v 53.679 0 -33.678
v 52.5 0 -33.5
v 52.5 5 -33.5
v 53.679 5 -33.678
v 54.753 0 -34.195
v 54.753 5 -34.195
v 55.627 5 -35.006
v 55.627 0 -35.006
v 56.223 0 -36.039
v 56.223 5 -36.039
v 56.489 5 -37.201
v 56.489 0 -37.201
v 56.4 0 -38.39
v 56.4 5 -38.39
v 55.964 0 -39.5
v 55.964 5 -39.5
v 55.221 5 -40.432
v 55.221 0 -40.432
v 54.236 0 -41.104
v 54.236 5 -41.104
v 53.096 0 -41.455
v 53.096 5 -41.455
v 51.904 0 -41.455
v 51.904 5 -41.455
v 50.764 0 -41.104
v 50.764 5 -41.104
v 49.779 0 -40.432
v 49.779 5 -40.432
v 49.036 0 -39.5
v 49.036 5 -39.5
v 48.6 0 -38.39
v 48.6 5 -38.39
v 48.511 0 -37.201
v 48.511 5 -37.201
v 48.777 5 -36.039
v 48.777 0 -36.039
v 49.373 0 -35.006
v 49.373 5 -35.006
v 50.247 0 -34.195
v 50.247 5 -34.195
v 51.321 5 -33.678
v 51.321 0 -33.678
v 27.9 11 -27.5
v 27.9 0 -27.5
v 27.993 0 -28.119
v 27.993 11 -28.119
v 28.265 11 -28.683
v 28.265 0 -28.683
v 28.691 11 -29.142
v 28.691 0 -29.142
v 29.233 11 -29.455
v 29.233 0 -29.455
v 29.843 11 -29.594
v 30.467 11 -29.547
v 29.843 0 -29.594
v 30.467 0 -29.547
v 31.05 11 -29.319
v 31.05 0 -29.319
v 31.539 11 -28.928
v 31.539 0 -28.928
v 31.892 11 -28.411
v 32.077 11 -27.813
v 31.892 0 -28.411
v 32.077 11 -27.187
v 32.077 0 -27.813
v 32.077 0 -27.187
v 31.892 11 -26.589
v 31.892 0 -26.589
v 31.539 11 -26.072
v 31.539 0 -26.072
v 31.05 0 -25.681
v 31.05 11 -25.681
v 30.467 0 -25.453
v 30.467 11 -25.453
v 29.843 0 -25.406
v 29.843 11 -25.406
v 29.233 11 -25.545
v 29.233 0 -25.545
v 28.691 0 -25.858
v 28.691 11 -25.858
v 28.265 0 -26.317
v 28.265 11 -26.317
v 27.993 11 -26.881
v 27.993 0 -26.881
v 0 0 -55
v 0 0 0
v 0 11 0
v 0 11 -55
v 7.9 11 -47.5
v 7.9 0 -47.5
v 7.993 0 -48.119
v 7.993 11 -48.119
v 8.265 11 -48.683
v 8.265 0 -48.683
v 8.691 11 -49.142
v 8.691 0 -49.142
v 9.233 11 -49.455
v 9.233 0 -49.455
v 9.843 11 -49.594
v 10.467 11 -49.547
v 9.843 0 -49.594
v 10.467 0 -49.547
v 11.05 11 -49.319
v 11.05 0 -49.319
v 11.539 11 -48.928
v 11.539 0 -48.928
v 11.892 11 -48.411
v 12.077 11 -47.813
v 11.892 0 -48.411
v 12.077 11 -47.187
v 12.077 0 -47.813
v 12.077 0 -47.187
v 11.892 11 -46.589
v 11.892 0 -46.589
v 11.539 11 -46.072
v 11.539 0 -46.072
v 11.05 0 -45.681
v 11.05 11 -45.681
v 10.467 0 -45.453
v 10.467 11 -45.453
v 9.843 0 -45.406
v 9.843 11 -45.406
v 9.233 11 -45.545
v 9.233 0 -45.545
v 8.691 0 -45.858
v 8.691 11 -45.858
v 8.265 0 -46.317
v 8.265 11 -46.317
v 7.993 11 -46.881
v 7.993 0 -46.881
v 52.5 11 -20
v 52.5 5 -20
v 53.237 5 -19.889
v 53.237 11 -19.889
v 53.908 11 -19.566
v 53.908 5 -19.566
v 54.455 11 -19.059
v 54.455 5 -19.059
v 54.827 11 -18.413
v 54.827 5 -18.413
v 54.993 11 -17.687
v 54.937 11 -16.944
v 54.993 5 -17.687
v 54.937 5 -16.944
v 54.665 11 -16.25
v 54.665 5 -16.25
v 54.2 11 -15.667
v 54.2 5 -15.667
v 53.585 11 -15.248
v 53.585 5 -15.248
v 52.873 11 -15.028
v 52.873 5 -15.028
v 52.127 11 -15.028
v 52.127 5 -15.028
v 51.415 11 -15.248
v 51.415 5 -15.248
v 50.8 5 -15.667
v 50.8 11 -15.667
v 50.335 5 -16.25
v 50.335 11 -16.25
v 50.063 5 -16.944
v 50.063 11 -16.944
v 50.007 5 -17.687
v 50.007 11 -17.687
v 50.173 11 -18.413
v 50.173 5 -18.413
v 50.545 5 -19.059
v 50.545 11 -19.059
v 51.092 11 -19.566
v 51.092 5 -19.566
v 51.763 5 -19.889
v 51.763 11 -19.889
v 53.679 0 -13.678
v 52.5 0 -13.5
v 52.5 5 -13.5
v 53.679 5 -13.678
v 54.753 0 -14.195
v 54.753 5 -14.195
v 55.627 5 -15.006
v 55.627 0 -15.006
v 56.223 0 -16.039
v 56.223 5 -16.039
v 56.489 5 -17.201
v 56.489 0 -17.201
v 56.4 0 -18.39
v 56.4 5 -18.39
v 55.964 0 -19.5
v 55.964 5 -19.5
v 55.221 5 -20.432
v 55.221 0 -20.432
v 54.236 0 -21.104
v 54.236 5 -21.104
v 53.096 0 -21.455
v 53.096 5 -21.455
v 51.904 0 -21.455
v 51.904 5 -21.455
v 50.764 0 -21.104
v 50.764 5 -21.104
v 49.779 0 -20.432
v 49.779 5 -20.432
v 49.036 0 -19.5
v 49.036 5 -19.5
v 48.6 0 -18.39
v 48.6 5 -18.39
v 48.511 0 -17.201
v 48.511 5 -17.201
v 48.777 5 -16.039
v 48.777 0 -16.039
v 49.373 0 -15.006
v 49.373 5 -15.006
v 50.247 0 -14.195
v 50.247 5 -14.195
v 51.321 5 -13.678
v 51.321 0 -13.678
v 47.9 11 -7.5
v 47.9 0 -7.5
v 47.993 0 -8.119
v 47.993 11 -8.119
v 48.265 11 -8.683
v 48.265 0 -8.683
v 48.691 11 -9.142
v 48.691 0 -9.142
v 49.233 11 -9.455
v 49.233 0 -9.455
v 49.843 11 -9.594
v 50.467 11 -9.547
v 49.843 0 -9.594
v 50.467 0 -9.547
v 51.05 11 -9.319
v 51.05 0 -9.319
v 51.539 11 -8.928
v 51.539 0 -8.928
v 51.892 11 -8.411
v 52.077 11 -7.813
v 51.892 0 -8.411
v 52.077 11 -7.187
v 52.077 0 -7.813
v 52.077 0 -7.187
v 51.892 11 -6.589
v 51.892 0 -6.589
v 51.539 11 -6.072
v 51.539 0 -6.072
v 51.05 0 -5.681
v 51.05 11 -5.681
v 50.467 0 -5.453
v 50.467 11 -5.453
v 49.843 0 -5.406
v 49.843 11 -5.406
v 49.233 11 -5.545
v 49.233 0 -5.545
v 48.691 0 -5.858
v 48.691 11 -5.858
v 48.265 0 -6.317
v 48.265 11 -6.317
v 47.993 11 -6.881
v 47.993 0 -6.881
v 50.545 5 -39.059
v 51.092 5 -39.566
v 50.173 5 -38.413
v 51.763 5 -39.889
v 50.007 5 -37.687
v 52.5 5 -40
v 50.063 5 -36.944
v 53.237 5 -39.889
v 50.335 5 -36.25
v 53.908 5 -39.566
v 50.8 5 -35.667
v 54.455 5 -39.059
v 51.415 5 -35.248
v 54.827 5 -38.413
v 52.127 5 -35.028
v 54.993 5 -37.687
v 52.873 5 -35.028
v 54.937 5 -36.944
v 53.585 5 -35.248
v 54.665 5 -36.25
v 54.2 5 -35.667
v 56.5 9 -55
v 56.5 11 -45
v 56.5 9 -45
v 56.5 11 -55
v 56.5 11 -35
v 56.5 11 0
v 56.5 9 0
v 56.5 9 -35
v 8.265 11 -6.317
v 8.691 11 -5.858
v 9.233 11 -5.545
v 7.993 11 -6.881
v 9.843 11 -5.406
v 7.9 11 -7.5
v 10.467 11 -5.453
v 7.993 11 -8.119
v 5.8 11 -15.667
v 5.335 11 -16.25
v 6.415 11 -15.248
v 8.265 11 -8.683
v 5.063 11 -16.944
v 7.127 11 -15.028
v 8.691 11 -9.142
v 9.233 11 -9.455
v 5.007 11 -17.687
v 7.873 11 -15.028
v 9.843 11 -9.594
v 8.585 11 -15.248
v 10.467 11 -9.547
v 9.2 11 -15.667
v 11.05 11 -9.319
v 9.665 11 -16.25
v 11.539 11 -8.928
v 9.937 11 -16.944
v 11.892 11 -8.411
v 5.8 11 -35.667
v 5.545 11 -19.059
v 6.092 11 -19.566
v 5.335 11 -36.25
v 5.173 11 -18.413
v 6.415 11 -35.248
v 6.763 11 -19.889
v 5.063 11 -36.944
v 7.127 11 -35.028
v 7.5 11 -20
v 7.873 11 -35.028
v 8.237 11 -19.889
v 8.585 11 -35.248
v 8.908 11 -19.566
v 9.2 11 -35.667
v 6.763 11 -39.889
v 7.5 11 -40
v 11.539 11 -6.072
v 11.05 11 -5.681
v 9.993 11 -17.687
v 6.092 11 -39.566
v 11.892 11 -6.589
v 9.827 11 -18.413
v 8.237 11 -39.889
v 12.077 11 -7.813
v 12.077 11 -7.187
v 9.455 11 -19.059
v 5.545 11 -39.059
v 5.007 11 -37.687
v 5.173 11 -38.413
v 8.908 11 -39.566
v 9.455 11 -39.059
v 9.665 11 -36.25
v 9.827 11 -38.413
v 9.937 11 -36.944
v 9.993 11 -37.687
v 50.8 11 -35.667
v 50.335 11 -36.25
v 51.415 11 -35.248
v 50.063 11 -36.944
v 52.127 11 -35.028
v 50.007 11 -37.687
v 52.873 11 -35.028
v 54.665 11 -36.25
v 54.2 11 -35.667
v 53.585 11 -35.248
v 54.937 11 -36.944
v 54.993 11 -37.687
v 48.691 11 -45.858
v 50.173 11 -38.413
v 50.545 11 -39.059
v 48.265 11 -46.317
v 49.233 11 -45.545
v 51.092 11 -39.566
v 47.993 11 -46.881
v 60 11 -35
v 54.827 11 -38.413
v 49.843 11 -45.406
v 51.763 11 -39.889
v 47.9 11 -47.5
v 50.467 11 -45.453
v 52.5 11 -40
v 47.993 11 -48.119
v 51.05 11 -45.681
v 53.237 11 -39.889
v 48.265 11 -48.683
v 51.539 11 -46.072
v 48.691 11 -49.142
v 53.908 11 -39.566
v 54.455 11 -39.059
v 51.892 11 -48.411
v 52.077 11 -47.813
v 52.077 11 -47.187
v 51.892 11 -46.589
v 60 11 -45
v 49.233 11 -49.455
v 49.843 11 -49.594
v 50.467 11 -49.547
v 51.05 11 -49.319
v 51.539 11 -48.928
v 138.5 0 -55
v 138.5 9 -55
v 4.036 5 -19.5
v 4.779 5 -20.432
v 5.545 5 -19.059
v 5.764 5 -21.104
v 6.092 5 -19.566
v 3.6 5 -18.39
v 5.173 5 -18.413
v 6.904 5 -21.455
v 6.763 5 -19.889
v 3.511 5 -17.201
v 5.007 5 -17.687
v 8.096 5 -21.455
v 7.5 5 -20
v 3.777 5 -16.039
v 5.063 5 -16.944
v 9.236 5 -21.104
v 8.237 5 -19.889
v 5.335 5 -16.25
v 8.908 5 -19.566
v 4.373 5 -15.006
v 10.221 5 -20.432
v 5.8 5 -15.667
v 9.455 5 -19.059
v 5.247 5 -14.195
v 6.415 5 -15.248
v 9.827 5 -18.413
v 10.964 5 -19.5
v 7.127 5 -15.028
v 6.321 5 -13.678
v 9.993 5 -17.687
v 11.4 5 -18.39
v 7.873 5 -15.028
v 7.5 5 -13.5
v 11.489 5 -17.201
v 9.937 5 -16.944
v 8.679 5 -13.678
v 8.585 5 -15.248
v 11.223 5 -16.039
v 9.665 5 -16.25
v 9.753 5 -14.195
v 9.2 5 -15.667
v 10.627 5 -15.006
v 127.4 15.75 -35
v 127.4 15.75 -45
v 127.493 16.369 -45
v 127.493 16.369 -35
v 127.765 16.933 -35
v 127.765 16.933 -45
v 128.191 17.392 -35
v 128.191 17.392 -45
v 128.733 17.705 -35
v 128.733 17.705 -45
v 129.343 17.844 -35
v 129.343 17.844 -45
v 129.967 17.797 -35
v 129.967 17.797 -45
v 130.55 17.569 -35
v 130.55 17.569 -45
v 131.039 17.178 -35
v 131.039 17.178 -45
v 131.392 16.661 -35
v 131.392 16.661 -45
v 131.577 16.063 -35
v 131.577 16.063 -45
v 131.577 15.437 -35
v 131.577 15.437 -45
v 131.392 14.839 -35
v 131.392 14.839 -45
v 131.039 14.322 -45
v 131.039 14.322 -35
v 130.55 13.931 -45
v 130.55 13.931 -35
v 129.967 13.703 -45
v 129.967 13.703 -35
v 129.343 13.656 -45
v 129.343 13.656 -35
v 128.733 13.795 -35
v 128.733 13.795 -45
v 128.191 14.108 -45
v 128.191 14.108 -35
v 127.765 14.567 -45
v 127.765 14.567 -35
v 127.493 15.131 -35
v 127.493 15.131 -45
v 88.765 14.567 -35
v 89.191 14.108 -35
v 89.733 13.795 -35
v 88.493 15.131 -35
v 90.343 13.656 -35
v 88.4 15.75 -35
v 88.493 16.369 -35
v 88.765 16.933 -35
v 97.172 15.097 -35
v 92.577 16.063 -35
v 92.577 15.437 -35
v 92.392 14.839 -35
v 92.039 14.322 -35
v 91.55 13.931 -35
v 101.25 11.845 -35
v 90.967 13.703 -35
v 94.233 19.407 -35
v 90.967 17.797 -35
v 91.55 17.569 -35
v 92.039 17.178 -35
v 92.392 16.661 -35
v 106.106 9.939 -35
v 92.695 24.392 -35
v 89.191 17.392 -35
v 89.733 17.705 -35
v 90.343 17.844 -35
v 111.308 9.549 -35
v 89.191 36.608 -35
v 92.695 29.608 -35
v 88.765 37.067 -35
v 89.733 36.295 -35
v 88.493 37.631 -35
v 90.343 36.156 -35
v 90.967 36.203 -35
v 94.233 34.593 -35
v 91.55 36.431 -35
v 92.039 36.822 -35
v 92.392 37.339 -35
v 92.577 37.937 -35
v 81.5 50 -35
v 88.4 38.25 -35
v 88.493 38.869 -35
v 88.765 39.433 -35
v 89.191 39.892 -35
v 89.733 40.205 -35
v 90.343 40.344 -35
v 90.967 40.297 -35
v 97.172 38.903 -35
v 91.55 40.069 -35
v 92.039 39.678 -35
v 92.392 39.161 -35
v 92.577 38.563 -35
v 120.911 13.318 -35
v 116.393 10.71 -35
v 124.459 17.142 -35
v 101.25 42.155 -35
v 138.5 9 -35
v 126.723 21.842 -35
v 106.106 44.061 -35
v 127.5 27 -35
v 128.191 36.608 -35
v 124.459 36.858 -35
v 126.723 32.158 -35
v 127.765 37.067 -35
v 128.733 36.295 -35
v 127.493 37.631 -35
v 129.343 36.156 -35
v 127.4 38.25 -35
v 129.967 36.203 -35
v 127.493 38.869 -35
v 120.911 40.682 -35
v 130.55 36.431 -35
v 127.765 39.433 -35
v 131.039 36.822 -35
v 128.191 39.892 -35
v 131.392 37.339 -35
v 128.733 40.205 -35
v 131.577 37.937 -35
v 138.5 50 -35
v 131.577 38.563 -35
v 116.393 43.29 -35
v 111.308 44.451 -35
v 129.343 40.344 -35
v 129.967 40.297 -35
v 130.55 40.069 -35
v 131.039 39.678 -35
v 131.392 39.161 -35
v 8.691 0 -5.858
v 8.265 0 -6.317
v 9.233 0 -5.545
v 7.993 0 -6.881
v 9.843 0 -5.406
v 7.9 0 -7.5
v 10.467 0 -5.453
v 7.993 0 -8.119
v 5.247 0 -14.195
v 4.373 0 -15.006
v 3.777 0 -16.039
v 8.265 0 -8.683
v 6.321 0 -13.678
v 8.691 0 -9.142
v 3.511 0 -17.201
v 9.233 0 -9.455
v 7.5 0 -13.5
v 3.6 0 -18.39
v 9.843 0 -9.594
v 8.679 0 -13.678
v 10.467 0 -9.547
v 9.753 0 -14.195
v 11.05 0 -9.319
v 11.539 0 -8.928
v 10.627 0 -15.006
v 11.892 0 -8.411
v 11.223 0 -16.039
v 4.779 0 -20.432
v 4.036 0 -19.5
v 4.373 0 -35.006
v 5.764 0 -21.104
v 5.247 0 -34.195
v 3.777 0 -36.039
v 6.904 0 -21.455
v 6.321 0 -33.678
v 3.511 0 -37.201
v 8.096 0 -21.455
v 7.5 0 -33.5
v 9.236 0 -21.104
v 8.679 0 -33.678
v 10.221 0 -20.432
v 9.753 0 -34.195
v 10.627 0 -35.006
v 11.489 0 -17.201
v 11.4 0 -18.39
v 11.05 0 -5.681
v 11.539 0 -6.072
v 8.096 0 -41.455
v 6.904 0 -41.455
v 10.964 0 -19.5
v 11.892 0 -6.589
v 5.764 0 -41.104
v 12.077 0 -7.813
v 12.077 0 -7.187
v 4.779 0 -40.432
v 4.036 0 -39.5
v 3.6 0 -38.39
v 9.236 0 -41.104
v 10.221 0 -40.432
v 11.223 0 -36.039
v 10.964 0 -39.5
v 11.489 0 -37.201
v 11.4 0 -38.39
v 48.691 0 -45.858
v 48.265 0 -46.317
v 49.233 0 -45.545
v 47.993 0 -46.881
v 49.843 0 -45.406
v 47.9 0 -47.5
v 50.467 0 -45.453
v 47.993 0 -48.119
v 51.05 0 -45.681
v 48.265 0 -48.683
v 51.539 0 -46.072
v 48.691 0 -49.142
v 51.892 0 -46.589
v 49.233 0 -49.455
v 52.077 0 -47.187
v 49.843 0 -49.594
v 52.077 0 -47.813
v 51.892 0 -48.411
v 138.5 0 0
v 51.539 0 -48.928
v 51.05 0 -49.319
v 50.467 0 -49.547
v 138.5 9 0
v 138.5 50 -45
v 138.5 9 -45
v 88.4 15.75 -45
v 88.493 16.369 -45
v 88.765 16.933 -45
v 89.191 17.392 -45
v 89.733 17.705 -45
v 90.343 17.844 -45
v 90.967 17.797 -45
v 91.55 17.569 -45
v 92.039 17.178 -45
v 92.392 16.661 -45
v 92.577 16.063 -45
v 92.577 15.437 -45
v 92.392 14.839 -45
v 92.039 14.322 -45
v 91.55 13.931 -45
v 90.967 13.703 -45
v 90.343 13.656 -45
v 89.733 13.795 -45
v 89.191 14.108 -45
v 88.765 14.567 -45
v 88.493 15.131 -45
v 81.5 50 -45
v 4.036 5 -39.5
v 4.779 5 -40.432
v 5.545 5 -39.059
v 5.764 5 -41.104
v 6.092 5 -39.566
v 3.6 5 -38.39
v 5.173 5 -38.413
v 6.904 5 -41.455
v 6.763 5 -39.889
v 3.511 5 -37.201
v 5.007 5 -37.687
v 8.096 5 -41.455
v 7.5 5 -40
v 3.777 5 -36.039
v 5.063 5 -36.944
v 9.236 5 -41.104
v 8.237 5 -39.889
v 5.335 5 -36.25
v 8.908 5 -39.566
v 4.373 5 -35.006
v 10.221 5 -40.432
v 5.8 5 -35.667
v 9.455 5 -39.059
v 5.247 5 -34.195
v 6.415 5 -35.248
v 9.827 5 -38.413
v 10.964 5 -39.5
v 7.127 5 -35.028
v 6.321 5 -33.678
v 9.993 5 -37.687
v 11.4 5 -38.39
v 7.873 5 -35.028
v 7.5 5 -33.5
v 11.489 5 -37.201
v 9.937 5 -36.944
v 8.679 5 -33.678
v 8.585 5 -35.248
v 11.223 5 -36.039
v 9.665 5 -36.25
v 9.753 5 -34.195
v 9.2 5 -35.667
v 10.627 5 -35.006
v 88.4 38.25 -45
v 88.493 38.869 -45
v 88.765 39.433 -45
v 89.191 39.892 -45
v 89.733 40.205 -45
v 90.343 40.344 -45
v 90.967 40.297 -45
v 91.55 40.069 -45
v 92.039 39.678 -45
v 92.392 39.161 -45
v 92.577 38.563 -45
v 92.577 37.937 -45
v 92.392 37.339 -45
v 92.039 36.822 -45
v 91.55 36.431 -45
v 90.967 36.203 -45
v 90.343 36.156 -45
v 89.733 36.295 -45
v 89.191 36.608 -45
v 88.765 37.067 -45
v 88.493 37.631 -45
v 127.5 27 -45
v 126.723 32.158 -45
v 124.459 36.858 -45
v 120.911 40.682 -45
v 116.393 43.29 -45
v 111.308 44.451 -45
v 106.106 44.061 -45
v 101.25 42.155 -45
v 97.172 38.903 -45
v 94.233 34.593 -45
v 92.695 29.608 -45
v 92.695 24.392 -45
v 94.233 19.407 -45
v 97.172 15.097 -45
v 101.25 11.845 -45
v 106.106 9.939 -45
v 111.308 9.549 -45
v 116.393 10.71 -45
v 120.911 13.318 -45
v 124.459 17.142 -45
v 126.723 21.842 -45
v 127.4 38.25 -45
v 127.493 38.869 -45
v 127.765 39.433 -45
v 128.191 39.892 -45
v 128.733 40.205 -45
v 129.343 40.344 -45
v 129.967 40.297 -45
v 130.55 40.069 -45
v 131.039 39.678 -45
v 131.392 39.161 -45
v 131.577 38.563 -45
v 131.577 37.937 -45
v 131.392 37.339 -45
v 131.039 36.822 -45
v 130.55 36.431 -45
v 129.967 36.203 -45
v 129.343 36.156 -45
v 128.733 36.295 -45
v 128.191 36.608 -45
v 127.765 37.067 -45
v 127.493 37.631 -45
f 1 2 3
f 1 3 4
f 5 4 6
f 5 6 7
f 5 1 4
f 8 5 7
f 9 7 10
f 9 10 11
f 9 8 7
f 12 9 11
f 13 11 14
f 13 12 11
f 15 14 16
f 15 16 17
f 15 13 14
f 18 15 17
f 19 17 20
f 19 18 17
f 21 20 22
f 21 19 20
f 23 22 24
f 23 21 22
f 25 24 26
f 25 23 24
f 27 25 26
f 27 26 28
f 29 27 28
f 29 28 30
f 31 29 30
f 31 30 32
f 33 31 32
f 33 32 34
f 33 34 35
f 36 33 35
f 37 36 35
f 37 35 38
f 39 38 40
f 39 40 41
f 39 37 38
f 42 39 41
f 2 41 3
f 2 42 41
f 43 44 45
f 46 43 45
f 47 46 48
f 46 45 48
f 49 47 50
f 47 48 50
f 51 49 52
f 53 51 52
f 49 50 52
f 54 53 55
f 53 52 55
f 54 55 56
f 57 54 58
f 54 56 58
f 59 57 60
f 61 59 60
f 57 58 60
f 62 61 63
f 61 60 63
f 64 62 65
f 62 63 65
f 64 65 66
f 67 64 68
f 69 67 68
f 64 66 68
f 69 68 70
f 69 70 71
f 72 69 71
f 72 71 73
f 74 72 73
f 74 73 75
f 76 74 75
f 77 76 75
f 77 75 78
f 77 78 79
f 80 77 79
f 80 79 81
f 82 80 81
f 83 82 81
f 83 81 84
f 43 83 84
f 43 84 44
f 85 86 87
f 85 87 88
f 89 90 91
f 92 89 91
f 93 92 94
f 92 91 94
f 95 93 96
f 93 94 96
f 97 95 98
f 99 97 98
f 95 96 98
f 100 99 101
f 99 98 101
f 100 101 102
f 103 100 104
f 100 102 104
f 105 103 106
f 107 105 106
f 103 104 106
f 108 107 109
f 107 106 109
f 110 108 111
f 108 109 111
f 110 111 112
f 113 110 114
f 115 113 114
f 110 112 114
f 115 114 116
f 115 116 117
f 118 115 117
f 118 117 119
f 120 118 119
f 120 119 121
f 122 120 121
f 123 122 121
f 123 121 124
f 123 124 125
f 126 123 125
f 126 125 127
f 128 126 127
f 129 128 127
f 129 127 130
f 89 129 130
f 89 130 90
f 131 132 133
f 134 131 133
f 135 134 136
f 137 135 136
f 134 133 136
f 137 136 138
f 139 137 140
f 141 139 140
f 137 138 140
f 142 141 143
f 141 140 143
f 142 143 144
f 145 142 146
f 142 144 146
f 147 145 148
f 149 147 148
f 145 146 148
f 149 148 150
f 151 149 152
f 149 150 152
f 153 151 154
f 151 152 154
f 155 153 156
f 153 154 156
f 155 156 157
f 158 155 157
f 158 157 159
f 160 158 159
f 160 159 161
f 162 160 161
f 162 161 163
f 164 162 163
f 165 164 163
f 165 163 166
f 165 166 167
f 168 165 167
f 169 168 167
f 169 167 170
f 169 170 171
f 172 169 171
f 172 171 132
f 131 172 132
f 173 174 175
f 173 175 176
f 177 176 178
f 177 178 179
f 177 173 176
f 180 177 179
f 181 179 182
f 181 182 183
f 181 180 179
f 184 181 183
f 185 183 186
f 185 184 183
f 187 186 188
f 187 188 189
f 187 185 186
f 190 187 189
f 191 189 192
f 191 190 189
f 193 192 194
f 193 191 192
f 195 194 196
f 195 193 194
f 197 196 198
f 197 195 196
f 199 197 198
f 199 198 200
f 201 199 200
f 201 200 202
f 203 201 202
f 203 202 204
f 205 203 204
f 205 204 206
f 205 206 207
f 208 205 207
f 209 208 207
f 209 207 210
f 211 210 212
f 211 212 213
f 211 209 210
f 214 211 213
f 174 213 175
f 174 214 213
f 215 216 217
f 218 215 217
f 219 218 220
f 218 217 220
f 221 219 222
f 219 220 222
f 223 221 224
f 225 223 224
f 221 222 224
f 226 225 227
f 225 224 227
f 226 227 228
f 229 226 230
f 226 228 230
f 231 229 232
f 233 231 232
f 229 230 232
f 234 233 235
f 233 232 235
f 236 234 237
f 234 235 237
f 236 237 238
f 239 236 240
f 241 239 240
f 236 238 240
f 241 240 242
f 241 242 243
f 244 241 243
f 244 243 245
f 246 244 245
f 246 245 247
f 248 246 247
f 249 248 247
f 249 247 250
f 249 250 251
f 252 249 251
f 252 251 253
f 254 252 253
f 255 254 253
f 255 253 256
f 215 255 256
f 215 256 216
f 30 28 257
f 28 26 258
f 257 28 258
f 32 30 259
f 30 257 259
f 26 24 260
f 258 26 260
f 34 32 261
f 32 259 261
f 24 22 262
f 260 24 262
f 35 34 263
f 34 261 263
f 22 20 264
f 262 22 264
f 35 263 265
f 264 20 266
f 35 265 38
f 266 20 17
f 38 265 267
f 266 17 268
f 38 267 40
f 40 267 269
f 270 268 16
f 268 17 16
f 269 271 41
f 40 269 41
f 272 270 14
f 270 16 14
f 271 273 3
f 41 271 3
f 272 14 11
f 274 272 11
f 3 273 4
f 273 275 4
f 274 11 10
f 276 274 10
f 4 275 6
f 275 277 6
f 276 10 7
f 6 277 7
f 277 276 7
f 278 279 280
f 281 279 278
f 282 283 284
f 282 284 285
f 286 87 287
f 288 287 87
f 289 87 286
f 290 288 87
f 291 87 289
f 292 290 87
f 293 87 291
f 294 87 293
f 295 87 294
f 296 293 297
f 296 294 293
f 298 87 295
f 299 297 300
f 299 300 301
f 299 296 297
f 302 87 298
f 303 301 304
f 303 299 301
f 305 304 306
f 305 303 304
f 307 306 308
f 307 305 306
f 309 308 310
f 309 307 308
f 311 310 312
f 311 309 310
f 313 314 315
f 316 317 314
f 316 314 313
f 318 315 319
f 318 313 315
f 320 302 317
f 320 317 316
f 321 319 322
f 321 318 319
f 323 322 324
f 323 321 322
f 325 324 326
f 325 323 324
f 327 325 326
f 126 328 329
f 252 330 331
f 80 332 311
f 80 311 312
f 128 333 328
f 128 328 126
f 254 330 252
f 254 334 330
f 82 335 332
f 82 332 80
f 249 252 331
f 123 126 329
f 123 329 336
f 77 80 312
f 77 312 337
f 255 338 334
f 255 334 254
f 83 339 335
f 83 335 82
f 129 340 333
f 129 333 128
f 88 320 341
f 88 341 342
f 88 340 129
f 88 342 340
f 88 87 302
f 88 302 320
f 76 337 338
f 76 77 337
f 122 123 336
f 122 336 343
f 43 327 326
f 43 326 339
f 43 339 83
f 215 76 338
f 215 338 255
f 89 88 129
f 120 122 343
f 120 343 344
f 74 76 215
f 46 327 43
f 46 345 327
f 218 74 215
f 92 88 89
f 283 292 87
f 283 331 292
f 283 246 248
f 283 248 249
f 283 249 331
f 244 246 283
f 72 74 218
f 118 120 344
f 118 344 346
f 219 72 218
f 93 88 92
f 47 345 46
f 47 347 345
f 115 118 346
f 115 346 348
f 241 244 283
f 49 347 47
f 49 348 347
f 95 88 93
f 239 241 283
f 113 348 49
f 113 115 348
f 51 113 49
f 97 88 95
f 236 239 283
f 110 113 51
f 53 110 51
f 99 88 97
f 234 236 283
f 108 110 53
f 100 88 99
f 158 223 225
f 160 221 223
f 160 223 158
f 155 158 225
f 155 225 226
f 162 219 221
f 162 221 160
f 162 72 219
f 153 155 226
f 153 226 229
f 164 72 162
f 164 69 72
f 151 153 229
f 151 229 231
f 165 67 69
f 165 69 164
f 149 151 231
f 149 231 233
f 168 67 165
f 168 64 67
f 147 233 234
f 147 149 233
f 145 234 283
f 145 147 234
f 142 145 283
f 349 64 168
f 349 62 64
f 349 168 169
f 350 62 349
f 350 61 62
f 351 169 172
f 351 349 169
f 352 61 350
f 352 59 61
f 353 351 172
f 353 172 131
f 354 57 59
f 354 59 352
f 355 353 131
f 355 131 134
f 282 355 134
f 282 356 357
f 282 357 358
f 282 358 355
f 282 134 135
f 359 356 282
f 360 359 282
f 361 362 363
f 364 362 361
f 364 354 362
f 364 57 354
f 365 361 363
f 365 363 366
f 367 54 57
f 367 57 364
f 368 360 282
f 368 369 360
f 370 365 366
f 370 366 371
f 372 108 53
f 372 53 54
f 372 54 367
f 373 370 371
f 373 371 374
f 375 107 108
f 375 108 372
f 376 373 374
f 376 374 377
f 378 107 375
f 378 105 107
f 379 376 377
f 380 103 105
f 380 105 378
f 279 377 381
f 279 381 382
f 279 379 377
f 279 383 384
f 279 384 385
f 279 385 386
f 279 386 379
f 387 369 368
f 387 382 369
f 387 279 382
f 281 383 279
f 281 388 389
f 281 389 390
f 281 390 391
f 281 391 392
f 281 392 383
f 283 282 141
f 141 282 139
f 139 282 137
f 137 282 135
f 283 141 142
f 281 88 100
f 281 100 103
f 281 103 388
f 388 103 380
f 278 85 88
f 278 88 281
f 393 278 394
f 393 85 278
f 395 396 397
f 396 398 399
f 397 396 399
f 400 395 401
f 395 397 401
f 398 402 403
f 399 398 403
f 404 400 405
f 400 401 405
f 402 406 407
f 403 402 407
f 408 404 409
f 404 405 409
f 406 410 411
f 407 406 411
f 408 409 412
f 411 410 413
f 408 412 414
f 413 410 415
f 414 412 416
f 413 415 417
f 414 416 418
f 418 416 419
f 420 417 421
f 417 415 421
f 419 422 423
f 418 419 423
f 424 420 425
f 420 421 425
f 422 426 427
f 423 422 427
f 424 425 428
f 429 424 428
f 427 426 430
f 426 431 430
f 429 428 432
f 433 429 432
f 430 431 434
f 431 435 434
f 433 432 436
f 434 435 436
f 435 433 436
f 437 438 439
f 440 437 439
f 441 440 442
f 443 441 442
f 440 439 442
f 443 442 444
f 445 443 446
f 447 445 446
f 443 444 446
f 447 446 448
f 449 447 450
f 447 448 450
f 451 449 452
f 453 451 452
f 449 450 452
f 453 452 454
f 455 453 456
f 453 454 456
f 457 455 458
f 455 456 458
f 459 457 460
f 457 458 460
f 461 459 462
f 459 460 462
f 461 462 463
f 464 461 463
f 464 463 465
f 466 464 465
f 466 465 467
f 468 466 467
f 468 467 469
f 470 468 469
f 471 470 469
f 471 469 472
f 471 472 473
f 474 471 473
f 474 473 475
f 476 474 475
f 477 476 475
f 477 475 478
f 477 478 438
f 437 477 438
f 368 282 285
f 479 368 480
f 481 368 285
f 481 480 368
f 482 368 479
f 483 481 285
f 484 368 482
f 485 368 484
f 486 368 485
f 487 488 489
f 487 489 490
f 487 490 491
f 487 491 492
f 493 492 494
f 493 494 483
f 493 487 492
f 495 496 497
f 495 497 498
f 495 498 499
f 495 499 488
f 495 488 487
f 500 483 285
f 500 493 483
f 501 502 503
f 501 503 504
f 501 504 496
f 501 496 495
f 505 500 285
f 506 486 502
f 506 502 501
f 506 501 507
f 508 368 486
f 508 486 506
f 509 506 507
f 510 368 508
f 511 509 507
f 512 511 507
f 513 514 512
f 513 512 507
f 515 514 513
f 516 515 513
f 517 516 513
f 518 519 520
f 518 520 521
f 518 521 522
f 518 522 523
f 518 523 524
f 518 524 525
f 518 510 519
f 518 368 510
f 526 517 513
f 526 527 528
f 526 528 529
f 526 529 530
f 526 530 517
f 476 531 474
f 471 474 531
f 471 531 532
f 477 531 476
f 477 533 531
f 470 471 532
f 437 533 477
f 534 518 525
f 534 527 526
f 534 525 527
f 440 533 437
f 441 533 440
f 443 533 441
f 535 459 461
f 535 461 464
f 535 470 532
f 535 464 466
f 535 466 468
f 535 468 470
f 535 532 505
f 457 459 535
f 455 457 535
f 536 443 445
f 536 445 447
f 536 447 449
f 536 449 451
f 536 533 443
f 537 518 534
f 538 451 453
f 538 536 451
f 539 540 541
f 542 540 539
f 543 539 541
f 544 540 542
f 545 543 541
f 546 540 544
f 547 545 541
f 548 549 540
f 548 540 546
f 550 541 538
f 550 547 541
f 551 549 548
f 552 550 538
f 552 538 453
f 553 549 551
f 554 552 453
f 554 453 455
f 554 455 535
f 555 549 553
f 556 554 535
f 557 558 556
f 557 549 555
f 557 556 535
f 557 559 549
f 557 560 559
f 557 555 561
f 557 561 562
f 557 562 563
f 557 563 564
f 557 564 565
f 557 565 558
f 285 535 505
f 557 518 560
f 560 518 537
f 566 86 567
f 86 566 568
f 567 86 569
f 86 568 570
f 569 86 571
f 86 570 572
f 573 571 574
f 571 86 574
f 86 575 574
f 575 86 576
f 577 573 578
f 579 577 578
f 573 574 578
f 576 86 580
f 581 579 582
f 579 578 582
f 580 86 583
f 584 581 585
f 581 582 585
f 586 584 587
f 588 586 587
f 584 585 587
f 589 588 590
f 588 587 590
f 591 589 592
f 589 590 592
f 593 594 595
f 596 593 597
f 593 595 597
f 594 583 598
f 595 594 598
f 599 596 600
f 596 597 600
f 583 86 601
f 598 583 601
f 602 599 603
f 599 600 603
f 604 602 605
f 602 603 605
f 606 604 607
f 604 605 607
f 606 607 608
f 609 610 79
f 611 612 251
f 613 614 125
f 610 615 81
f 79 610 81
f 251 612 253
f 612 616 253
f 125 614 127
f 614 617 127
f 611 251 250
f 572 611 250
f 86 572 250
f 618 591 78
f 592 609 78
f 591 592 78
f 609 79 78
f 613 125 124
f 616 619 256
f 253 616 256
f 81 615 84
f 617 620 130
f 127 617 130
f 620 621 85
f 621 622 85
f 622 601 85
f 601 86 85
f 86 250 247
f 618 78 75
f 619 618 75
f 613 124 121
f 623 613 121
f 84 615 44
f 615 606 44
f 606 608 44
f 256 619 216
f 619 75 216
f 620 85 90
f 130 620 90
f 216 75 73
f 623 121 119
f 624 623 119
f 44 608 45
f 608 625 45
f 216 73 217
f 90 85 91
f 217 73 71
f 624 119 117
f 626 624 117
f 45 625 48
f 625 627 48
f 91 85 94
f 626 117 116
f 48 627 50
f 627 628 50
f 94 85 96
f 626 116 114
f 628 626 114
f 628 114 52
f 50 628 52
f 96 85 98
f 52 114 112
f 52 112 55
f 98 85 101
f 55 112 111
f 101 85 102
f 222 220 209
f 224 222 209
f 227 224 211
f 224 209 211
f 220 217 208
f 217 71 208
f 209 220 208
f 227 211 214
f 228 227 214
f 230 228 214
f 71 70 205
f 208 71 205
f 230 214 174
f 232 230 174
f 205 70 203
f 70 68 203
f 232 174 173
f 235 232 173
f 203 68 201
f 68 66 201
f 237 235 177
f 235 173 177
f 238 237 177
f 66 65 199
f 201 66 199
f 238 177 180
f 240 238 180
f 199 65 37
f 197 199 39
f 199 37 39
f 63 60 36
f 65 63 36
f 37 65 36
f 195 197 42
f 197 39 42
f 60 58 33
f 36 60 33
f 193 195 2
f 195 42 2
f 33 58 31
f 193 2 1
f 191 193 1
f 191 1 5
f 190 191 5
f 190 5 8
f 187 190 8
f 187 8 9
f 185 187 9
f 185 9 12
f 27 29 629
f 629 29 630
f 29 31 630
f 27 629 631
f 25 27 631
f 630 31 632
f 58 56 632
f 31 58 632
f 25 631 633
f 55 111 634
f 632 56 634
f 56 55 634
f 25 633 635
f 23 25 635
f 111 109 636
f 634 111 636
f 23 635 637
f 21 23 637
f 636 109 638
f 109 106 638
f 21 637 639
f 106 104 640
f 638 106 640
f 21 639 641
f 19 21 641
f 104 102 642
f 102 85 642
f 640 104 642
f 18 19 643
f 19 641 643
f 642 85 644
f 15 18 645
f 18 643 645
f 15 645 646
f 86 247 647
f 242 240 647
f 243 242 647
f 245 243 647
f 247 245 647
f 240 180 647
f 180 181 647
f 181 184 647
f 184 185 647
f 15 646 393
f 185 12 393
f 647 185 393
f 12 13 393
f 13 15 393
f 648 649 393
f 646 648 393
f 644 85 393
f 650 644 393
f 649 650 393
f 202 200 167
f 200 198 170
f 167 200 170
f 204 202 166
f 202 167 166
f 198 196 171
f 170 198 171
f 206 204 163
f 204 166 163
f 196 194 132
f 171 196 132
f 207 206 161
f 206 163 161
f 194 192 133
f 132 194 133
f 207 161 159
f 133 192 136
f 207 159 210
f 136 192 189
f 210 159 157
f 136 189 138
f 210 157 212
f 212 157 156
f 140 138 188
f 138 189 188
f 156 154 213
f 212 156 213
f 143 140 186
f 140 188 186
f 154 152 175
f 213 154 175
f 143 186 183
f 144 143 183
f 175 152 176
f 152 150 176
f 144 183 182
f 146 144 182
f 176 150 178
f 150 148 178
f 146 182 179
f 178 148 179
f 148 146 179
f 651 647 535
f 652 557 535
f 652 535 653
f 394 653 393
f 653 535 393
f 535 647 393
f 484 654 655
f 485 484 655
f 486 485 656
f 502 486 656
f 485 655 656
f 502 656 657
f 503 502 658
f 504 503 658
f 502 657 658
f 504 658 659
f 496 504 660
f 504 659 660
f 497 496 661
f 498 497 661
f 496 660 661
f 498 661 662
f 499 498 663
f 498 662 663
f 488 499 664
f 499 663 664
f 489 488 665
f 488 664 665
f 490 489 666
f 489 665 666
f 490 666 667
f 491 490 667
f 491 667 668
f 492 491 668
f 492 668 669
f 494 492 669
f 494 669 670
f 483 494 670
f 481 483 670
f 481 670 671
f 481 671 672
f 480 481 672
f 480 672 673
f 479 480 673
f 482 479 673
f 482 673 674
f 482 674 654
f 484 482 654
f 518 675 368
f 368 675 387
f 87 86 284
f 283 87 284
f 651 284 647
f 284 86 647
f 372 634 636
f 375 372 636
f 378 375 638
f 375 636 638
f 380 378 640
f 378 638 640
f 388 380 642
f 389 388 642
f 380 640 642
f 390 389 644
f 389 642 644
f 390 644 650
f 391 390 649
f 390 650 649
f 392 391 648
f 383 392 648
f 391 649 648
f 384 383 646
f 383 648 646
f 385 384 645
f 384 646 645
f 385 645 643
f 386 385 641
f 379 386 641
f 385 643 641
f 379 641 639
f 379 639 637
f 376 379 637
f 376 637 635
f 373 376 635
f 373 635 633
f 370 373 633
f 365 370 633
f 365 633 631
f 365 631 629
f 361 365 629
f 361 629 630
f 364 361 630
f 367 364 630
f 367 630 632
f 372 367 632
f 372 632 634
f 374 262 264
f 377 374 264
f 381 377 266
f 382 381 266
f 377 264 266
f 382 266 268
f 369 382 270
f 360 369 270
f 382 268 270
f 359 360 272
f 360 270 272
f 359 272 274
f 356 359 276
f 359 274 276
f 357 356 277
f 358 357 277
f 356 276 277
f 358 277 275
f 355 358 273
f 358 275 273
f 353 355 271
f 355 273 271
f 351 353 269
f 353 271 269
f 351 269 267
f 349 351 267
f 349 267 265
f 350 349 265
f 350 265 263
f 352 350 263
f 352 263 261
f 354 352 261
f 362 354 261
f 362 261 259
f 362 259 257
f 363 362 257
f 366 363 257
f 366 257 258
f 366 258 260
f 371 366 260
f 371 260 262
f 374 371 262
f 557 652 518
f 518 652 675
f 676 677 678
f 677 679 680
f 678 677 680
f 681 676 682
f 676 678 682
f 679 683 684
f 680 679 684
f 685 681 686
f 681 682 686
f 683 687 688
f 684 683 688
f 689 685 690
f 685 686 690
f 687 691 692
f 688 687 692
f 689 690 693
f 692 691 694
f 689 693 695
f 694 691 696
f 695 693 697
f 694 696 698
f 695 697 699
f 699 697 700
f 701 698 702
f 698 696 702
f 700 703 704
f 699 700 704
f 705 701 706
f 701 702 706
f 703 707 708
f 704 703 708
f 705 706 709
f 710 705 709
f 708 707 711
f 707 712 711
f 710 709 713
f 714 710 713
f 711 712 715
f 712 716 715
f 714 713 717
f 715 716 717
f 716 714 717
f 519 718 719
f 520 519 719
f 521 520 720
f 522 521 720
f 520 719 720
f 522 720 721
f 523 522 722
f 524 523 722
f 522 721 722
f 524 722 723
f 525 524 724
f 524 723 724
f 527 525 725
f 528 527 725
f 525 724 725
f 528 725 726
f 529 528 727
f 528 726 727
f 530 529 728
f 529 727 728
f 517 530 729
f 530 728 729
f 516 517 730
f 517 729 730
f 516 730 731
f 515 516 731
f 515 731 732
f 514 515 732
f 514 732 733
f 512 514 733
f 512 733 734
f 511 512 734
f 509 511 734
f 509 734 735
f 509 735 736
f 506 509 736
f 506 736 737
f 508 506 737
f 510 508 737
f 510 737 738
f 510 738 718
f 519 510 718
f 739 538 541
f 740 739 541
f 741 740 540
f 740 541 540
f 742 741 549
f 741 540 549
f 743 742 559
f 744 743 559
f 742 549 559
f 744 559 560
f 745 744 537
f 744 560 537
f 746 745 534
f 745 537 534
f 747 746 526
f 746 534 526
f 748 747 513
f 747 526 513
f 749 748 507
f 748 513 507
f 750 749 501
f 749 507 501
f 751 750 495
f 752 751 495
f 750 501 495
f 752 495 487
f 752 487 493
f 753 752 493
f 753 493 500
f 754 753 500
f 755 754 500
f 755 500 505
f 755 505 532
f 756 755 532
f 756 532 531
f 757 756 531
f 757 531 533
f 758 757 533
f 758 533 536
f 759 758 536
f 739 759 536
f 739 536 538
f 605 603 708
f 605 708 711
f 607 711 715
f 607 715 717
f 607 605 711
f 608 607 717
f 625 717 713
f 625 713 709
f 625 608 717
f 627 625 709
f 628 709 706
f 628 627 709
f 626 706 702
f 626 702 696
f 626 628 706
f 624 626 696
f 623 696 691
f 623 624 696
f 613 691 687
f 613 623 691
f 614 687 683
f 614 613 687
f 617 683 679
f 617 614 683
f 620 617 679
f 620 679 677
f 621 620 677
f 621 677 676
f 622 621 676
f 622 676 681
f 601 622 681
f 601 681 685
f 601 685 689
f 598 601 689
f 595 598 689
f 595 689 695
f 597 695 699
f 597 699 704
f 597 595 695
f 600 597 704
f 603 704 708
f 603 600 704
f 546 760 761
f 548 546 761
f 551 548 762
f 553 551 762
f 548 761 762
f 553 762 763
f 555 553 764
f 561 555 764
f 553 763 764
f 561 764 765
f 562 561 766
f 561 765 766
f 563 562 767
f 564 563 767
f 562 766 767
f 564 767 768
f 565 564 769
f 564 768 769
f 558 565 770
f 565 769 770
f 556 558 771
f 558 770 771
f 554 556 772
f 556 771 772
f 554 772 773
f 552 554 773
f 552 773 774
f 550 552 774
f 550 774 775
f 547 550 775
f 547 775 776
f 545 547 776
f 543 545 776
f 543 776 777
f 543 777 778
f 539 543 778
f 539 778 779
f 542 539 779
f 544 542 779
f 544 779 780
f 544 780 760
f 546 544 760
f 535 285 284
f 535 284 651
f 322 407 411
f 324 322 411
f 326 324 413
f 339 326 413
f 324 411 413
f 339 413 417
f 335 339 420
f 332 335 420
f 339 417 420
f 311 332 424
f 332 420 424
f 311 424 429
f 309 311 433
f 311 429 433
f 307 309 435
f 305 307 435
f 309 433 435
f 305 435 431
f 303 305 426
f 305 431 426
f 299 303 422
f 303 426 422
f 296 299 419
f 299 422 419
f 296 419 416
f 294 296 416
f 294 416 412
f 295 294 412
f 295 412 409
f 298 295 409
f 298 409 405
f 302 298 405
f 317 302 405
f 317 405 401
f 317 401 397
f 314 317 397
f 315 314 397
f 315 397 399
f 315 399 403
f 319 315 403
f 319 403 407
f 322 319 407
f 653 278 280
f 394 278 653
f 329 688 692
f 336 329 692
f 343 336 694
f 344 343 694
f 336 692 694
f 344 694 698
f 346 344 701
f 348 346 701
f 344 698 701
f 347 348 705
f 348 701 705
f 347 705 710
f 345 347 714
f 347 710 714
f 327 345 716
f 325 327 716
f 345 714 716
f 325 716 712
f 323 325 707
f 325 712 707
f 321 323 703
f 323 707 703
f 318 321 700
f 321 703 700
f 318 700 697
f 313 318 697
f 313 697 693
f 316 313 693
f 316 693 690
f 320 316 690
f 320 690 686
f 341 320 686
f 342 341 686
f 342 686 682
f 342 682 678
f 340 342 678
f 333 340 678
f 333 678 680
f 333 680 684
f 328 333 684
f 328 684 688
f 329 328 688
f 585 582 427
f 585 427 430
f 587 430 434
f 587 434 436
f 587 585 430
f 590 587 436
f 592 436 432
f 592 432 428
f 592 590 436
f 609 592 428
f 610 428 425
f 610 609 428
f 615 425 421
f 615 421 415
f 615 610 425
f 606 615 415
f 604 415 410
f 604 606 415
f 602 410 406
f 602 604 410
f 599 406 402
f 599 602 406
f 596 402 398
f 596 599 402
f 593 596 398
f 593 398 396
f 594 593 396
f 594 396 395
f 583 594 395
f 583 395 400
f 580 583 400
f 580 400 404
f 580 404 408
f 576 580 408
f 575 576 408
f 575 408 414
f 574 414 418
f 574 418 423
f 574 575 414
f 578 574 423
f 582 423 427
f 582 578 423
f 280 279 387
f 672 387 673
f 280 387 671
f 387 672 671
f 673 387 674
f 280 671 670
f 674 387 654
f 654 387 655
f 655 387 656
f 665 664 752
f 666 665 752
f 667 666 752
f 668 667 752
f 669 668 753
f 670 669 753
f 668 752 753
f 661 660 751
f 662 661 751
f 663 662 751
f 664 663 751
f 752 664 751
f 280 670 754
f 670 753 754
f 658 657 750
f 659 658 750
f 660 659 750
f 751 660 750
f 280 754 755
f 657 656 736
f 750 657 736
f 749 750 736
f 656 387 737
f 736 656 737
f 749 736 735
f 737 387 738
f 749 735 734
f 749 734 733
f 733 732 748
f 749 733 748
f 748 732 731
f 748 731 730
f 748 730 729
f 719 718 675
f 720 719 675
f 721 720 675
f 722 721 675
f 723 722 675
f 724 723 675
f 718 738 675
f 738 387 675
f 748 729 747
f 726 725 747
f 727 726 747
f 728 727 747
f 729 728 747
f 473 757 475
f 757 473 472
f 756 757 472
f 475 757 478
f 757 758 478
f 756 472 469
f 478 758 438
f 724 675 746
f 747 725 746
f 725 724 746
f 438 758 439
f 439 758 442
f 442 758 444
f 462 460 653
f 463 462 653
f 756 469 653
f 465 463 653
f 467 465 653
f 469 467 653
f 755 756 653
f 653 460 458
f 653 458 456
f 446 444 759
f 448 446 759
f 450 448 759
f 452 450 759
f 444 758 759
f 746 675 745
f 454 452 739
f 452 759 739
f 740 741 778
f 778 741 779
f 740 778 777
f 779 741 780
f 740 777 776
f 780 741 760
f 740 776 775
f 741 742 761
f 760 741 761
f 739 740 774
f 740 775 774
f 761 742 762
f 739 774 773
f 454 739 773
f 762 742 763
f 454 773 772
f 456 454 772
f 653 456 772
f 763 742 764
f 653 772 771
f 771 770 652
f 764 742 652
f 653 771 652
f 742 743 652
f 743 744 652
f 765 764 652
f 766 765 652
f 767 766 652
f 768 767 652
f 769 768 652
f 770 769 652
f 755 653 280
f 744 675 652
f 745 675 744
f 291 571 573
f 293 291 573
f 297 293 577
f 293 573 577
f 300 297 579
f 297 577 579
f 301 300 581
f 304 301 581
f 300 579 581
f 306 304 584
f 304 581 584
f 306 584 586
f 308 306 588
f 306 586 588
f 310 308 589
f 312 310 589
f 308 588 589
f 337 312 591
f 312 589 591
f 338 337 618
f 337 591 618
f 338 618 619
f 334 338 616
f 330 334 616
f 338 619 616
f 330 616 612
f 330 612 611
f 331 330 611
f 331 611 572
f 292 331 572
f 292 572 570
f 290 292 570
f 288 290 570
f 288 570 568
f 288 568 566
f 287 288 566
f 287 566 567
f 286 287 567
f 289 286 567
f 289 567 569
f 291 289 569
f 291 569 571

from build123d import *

# Parameters (mm, degrees)
SKETCH_1_W          = 138.5
SKETCH_1_H          = 55
EXTRUDE_1_DEPTH     = 11
EXTRUDE_2_DEPTH     = 10
SKETCH_3_W          = 82
SKETCH_3_H          = 10
CUT_EXTRUDE_1_DEPTH = 2
SKETCH_4_W          = 82
SKETCH_4_H          = 35
CUT_EXTRUDE_2_DEPTH = 2
SKETCH_5_R          = 17.5
CUT_EXTRUDE_3_DEPTH = 152.351412283
HOLE_WIZARD_M5_1_D  = 4.2
SKETCH_9_R          = 4
CUT_EXTRUDE_5_DEPTH = 5
SKETCH_10_R         = 2.5
CUT_EXTRUDE_6_DEPTH = 156.667112776
HOLE_WIZARD_M5_2_D  = 4.2


with BuildPart() as part:
    # 스케치1 → 보스-돌출1 (new body)
    with BuildSketch(Plane(origin=(0, 0, 0), x_dir=(1, 0, 0), z_dir=(0, 1, 0))):
        with Locations((69.25, 27.5)):
            Rectangle(SKETCH_1_W, SKETCH_1_H)
    extrude(amount=EXTRUDE_1_DEPTH)

    # 스케치2 → 보스-돌출2 (add)
    with BuildSketch(Plane(origin=(0, 0, -45), x_dir=(-1, 0, 0), z_dir=(0, 0, -1))):
        Polygon((-138.5, 11), (-138.5, 50), (-81.5, 50), (-60, 11), align=None)
    extrude(amount=-EXTRUDE_2_DEPTH)

    # 스케치3 → 컷-돌출1 (cut)
    with BuildSketch(Plane(origin=(0, 11, 0), x_dir=(1, 0, 0), z_dir=(0, 1, 0))):
        with Locations((97.5, 50)):
            Rectangle(SKETCH_3_W, SKETCH_3_H)
    extrude(amount=-CUT_EXTRUDE_1_DEPTH, mode=Mode.SUBTRACT)

    # 스케치4 → 컷-돌출2 (cut)
    with BuildSketch(Plane(origin=(0, 11, 0), x_dir=(1, 0, 0), z_dir=(0, 1, 0))):
        with Locations((97.5, 17.5)):
            Rectangle(SKETCH_4_W, SKETCH_4_H)
    extrude(amount=-CUT_EXTRUDE_2_DEPTH, mode=Mode.SUBTRACT)

    # 스케치5 → 컷-돌출3 (cut, through all)
    with BuildSketch(Plane.XY.offset(-35)):
        with Locations((110, 27)):
            Circle(SKETCH_5_R)
    extrude(amount=-CUT_EXTRUDE_3_DEPTH, mode=Mode.SUBTRACT)

    # M5 나사 구멍1 (through all)
    with Locations(Plane.XY.offset(-35)):
        with Locations((90.5, 38.25), (129.5, 38.25), (129.5, 15.75), (90.5, 15.75)):
            Hole(HOLE_WIZARD_M5_1_D / 2)

    # 스케치9 → 컷-돌출5 (cut)
    with BuildSketch(Plane(origin=(0, 0, 0), x_dir=(1, 0, 0), z_dir=(0, 1, 0))):
        with Locations(Location((7.5, 37.5, 0), (0, 0, 270))):
            Circle(SKETCH_9_R)
        with Locations(Location((52.5, 37.5, 0), (0, 0, 270))):
            Circle(SKETCH_9_R)
        with Locations(Location((7.5, 17.5, 0), (0, 0, 270))):
            Circle(SKETCH_9_R)
        with Locations(Location((52.5, 17.5, 0), (0, 0, 270))):
            Circle(SKETCH_9_R)
    extrude(amount=CUT_EXTRUDE_5_DEPTH, mode=Mode.SUBTRACT)

    # 스케치10 → 컷-돌출6 (cut, through all)
    with BuildSketch(Plane.XZ.offset(-5)):
        with Locations(Location((52.5, -17.5, 0), (0, 0, 270))):
            Circle(SKETCH_10_R)
        with Locations(Location((52.5, -37.5, 0), (0, 0, 270))):
            Circle(SKETCH_10_R)
        with Locations(Location((7.5, -37.5, 0), (0, 0, 270))):
            Circle(SKETCH_10_R)
        with Locations(Location((7.5, -17.5, 0), (0, 0, 270))):
            Circle(SKETCH_10_R)
    extrude(amount=-CUT_EXTRUDE_6_DEPTH, mode=Mode.SUBTRACT)

    # M5 나사 구멍2 (through all)
    with Locations(Plane(origin=(0, 11, 0), x_dir=(1, 0, 0), z_dir=(0, 1, 0))):
        with Locations((10, 47.5), (50, 47.5), (10, 7.5), (50, 7.5), (30, 27.5)):
            Hole(HOLE_WIZARD_M5_2_D / 2)


solid = part.part
